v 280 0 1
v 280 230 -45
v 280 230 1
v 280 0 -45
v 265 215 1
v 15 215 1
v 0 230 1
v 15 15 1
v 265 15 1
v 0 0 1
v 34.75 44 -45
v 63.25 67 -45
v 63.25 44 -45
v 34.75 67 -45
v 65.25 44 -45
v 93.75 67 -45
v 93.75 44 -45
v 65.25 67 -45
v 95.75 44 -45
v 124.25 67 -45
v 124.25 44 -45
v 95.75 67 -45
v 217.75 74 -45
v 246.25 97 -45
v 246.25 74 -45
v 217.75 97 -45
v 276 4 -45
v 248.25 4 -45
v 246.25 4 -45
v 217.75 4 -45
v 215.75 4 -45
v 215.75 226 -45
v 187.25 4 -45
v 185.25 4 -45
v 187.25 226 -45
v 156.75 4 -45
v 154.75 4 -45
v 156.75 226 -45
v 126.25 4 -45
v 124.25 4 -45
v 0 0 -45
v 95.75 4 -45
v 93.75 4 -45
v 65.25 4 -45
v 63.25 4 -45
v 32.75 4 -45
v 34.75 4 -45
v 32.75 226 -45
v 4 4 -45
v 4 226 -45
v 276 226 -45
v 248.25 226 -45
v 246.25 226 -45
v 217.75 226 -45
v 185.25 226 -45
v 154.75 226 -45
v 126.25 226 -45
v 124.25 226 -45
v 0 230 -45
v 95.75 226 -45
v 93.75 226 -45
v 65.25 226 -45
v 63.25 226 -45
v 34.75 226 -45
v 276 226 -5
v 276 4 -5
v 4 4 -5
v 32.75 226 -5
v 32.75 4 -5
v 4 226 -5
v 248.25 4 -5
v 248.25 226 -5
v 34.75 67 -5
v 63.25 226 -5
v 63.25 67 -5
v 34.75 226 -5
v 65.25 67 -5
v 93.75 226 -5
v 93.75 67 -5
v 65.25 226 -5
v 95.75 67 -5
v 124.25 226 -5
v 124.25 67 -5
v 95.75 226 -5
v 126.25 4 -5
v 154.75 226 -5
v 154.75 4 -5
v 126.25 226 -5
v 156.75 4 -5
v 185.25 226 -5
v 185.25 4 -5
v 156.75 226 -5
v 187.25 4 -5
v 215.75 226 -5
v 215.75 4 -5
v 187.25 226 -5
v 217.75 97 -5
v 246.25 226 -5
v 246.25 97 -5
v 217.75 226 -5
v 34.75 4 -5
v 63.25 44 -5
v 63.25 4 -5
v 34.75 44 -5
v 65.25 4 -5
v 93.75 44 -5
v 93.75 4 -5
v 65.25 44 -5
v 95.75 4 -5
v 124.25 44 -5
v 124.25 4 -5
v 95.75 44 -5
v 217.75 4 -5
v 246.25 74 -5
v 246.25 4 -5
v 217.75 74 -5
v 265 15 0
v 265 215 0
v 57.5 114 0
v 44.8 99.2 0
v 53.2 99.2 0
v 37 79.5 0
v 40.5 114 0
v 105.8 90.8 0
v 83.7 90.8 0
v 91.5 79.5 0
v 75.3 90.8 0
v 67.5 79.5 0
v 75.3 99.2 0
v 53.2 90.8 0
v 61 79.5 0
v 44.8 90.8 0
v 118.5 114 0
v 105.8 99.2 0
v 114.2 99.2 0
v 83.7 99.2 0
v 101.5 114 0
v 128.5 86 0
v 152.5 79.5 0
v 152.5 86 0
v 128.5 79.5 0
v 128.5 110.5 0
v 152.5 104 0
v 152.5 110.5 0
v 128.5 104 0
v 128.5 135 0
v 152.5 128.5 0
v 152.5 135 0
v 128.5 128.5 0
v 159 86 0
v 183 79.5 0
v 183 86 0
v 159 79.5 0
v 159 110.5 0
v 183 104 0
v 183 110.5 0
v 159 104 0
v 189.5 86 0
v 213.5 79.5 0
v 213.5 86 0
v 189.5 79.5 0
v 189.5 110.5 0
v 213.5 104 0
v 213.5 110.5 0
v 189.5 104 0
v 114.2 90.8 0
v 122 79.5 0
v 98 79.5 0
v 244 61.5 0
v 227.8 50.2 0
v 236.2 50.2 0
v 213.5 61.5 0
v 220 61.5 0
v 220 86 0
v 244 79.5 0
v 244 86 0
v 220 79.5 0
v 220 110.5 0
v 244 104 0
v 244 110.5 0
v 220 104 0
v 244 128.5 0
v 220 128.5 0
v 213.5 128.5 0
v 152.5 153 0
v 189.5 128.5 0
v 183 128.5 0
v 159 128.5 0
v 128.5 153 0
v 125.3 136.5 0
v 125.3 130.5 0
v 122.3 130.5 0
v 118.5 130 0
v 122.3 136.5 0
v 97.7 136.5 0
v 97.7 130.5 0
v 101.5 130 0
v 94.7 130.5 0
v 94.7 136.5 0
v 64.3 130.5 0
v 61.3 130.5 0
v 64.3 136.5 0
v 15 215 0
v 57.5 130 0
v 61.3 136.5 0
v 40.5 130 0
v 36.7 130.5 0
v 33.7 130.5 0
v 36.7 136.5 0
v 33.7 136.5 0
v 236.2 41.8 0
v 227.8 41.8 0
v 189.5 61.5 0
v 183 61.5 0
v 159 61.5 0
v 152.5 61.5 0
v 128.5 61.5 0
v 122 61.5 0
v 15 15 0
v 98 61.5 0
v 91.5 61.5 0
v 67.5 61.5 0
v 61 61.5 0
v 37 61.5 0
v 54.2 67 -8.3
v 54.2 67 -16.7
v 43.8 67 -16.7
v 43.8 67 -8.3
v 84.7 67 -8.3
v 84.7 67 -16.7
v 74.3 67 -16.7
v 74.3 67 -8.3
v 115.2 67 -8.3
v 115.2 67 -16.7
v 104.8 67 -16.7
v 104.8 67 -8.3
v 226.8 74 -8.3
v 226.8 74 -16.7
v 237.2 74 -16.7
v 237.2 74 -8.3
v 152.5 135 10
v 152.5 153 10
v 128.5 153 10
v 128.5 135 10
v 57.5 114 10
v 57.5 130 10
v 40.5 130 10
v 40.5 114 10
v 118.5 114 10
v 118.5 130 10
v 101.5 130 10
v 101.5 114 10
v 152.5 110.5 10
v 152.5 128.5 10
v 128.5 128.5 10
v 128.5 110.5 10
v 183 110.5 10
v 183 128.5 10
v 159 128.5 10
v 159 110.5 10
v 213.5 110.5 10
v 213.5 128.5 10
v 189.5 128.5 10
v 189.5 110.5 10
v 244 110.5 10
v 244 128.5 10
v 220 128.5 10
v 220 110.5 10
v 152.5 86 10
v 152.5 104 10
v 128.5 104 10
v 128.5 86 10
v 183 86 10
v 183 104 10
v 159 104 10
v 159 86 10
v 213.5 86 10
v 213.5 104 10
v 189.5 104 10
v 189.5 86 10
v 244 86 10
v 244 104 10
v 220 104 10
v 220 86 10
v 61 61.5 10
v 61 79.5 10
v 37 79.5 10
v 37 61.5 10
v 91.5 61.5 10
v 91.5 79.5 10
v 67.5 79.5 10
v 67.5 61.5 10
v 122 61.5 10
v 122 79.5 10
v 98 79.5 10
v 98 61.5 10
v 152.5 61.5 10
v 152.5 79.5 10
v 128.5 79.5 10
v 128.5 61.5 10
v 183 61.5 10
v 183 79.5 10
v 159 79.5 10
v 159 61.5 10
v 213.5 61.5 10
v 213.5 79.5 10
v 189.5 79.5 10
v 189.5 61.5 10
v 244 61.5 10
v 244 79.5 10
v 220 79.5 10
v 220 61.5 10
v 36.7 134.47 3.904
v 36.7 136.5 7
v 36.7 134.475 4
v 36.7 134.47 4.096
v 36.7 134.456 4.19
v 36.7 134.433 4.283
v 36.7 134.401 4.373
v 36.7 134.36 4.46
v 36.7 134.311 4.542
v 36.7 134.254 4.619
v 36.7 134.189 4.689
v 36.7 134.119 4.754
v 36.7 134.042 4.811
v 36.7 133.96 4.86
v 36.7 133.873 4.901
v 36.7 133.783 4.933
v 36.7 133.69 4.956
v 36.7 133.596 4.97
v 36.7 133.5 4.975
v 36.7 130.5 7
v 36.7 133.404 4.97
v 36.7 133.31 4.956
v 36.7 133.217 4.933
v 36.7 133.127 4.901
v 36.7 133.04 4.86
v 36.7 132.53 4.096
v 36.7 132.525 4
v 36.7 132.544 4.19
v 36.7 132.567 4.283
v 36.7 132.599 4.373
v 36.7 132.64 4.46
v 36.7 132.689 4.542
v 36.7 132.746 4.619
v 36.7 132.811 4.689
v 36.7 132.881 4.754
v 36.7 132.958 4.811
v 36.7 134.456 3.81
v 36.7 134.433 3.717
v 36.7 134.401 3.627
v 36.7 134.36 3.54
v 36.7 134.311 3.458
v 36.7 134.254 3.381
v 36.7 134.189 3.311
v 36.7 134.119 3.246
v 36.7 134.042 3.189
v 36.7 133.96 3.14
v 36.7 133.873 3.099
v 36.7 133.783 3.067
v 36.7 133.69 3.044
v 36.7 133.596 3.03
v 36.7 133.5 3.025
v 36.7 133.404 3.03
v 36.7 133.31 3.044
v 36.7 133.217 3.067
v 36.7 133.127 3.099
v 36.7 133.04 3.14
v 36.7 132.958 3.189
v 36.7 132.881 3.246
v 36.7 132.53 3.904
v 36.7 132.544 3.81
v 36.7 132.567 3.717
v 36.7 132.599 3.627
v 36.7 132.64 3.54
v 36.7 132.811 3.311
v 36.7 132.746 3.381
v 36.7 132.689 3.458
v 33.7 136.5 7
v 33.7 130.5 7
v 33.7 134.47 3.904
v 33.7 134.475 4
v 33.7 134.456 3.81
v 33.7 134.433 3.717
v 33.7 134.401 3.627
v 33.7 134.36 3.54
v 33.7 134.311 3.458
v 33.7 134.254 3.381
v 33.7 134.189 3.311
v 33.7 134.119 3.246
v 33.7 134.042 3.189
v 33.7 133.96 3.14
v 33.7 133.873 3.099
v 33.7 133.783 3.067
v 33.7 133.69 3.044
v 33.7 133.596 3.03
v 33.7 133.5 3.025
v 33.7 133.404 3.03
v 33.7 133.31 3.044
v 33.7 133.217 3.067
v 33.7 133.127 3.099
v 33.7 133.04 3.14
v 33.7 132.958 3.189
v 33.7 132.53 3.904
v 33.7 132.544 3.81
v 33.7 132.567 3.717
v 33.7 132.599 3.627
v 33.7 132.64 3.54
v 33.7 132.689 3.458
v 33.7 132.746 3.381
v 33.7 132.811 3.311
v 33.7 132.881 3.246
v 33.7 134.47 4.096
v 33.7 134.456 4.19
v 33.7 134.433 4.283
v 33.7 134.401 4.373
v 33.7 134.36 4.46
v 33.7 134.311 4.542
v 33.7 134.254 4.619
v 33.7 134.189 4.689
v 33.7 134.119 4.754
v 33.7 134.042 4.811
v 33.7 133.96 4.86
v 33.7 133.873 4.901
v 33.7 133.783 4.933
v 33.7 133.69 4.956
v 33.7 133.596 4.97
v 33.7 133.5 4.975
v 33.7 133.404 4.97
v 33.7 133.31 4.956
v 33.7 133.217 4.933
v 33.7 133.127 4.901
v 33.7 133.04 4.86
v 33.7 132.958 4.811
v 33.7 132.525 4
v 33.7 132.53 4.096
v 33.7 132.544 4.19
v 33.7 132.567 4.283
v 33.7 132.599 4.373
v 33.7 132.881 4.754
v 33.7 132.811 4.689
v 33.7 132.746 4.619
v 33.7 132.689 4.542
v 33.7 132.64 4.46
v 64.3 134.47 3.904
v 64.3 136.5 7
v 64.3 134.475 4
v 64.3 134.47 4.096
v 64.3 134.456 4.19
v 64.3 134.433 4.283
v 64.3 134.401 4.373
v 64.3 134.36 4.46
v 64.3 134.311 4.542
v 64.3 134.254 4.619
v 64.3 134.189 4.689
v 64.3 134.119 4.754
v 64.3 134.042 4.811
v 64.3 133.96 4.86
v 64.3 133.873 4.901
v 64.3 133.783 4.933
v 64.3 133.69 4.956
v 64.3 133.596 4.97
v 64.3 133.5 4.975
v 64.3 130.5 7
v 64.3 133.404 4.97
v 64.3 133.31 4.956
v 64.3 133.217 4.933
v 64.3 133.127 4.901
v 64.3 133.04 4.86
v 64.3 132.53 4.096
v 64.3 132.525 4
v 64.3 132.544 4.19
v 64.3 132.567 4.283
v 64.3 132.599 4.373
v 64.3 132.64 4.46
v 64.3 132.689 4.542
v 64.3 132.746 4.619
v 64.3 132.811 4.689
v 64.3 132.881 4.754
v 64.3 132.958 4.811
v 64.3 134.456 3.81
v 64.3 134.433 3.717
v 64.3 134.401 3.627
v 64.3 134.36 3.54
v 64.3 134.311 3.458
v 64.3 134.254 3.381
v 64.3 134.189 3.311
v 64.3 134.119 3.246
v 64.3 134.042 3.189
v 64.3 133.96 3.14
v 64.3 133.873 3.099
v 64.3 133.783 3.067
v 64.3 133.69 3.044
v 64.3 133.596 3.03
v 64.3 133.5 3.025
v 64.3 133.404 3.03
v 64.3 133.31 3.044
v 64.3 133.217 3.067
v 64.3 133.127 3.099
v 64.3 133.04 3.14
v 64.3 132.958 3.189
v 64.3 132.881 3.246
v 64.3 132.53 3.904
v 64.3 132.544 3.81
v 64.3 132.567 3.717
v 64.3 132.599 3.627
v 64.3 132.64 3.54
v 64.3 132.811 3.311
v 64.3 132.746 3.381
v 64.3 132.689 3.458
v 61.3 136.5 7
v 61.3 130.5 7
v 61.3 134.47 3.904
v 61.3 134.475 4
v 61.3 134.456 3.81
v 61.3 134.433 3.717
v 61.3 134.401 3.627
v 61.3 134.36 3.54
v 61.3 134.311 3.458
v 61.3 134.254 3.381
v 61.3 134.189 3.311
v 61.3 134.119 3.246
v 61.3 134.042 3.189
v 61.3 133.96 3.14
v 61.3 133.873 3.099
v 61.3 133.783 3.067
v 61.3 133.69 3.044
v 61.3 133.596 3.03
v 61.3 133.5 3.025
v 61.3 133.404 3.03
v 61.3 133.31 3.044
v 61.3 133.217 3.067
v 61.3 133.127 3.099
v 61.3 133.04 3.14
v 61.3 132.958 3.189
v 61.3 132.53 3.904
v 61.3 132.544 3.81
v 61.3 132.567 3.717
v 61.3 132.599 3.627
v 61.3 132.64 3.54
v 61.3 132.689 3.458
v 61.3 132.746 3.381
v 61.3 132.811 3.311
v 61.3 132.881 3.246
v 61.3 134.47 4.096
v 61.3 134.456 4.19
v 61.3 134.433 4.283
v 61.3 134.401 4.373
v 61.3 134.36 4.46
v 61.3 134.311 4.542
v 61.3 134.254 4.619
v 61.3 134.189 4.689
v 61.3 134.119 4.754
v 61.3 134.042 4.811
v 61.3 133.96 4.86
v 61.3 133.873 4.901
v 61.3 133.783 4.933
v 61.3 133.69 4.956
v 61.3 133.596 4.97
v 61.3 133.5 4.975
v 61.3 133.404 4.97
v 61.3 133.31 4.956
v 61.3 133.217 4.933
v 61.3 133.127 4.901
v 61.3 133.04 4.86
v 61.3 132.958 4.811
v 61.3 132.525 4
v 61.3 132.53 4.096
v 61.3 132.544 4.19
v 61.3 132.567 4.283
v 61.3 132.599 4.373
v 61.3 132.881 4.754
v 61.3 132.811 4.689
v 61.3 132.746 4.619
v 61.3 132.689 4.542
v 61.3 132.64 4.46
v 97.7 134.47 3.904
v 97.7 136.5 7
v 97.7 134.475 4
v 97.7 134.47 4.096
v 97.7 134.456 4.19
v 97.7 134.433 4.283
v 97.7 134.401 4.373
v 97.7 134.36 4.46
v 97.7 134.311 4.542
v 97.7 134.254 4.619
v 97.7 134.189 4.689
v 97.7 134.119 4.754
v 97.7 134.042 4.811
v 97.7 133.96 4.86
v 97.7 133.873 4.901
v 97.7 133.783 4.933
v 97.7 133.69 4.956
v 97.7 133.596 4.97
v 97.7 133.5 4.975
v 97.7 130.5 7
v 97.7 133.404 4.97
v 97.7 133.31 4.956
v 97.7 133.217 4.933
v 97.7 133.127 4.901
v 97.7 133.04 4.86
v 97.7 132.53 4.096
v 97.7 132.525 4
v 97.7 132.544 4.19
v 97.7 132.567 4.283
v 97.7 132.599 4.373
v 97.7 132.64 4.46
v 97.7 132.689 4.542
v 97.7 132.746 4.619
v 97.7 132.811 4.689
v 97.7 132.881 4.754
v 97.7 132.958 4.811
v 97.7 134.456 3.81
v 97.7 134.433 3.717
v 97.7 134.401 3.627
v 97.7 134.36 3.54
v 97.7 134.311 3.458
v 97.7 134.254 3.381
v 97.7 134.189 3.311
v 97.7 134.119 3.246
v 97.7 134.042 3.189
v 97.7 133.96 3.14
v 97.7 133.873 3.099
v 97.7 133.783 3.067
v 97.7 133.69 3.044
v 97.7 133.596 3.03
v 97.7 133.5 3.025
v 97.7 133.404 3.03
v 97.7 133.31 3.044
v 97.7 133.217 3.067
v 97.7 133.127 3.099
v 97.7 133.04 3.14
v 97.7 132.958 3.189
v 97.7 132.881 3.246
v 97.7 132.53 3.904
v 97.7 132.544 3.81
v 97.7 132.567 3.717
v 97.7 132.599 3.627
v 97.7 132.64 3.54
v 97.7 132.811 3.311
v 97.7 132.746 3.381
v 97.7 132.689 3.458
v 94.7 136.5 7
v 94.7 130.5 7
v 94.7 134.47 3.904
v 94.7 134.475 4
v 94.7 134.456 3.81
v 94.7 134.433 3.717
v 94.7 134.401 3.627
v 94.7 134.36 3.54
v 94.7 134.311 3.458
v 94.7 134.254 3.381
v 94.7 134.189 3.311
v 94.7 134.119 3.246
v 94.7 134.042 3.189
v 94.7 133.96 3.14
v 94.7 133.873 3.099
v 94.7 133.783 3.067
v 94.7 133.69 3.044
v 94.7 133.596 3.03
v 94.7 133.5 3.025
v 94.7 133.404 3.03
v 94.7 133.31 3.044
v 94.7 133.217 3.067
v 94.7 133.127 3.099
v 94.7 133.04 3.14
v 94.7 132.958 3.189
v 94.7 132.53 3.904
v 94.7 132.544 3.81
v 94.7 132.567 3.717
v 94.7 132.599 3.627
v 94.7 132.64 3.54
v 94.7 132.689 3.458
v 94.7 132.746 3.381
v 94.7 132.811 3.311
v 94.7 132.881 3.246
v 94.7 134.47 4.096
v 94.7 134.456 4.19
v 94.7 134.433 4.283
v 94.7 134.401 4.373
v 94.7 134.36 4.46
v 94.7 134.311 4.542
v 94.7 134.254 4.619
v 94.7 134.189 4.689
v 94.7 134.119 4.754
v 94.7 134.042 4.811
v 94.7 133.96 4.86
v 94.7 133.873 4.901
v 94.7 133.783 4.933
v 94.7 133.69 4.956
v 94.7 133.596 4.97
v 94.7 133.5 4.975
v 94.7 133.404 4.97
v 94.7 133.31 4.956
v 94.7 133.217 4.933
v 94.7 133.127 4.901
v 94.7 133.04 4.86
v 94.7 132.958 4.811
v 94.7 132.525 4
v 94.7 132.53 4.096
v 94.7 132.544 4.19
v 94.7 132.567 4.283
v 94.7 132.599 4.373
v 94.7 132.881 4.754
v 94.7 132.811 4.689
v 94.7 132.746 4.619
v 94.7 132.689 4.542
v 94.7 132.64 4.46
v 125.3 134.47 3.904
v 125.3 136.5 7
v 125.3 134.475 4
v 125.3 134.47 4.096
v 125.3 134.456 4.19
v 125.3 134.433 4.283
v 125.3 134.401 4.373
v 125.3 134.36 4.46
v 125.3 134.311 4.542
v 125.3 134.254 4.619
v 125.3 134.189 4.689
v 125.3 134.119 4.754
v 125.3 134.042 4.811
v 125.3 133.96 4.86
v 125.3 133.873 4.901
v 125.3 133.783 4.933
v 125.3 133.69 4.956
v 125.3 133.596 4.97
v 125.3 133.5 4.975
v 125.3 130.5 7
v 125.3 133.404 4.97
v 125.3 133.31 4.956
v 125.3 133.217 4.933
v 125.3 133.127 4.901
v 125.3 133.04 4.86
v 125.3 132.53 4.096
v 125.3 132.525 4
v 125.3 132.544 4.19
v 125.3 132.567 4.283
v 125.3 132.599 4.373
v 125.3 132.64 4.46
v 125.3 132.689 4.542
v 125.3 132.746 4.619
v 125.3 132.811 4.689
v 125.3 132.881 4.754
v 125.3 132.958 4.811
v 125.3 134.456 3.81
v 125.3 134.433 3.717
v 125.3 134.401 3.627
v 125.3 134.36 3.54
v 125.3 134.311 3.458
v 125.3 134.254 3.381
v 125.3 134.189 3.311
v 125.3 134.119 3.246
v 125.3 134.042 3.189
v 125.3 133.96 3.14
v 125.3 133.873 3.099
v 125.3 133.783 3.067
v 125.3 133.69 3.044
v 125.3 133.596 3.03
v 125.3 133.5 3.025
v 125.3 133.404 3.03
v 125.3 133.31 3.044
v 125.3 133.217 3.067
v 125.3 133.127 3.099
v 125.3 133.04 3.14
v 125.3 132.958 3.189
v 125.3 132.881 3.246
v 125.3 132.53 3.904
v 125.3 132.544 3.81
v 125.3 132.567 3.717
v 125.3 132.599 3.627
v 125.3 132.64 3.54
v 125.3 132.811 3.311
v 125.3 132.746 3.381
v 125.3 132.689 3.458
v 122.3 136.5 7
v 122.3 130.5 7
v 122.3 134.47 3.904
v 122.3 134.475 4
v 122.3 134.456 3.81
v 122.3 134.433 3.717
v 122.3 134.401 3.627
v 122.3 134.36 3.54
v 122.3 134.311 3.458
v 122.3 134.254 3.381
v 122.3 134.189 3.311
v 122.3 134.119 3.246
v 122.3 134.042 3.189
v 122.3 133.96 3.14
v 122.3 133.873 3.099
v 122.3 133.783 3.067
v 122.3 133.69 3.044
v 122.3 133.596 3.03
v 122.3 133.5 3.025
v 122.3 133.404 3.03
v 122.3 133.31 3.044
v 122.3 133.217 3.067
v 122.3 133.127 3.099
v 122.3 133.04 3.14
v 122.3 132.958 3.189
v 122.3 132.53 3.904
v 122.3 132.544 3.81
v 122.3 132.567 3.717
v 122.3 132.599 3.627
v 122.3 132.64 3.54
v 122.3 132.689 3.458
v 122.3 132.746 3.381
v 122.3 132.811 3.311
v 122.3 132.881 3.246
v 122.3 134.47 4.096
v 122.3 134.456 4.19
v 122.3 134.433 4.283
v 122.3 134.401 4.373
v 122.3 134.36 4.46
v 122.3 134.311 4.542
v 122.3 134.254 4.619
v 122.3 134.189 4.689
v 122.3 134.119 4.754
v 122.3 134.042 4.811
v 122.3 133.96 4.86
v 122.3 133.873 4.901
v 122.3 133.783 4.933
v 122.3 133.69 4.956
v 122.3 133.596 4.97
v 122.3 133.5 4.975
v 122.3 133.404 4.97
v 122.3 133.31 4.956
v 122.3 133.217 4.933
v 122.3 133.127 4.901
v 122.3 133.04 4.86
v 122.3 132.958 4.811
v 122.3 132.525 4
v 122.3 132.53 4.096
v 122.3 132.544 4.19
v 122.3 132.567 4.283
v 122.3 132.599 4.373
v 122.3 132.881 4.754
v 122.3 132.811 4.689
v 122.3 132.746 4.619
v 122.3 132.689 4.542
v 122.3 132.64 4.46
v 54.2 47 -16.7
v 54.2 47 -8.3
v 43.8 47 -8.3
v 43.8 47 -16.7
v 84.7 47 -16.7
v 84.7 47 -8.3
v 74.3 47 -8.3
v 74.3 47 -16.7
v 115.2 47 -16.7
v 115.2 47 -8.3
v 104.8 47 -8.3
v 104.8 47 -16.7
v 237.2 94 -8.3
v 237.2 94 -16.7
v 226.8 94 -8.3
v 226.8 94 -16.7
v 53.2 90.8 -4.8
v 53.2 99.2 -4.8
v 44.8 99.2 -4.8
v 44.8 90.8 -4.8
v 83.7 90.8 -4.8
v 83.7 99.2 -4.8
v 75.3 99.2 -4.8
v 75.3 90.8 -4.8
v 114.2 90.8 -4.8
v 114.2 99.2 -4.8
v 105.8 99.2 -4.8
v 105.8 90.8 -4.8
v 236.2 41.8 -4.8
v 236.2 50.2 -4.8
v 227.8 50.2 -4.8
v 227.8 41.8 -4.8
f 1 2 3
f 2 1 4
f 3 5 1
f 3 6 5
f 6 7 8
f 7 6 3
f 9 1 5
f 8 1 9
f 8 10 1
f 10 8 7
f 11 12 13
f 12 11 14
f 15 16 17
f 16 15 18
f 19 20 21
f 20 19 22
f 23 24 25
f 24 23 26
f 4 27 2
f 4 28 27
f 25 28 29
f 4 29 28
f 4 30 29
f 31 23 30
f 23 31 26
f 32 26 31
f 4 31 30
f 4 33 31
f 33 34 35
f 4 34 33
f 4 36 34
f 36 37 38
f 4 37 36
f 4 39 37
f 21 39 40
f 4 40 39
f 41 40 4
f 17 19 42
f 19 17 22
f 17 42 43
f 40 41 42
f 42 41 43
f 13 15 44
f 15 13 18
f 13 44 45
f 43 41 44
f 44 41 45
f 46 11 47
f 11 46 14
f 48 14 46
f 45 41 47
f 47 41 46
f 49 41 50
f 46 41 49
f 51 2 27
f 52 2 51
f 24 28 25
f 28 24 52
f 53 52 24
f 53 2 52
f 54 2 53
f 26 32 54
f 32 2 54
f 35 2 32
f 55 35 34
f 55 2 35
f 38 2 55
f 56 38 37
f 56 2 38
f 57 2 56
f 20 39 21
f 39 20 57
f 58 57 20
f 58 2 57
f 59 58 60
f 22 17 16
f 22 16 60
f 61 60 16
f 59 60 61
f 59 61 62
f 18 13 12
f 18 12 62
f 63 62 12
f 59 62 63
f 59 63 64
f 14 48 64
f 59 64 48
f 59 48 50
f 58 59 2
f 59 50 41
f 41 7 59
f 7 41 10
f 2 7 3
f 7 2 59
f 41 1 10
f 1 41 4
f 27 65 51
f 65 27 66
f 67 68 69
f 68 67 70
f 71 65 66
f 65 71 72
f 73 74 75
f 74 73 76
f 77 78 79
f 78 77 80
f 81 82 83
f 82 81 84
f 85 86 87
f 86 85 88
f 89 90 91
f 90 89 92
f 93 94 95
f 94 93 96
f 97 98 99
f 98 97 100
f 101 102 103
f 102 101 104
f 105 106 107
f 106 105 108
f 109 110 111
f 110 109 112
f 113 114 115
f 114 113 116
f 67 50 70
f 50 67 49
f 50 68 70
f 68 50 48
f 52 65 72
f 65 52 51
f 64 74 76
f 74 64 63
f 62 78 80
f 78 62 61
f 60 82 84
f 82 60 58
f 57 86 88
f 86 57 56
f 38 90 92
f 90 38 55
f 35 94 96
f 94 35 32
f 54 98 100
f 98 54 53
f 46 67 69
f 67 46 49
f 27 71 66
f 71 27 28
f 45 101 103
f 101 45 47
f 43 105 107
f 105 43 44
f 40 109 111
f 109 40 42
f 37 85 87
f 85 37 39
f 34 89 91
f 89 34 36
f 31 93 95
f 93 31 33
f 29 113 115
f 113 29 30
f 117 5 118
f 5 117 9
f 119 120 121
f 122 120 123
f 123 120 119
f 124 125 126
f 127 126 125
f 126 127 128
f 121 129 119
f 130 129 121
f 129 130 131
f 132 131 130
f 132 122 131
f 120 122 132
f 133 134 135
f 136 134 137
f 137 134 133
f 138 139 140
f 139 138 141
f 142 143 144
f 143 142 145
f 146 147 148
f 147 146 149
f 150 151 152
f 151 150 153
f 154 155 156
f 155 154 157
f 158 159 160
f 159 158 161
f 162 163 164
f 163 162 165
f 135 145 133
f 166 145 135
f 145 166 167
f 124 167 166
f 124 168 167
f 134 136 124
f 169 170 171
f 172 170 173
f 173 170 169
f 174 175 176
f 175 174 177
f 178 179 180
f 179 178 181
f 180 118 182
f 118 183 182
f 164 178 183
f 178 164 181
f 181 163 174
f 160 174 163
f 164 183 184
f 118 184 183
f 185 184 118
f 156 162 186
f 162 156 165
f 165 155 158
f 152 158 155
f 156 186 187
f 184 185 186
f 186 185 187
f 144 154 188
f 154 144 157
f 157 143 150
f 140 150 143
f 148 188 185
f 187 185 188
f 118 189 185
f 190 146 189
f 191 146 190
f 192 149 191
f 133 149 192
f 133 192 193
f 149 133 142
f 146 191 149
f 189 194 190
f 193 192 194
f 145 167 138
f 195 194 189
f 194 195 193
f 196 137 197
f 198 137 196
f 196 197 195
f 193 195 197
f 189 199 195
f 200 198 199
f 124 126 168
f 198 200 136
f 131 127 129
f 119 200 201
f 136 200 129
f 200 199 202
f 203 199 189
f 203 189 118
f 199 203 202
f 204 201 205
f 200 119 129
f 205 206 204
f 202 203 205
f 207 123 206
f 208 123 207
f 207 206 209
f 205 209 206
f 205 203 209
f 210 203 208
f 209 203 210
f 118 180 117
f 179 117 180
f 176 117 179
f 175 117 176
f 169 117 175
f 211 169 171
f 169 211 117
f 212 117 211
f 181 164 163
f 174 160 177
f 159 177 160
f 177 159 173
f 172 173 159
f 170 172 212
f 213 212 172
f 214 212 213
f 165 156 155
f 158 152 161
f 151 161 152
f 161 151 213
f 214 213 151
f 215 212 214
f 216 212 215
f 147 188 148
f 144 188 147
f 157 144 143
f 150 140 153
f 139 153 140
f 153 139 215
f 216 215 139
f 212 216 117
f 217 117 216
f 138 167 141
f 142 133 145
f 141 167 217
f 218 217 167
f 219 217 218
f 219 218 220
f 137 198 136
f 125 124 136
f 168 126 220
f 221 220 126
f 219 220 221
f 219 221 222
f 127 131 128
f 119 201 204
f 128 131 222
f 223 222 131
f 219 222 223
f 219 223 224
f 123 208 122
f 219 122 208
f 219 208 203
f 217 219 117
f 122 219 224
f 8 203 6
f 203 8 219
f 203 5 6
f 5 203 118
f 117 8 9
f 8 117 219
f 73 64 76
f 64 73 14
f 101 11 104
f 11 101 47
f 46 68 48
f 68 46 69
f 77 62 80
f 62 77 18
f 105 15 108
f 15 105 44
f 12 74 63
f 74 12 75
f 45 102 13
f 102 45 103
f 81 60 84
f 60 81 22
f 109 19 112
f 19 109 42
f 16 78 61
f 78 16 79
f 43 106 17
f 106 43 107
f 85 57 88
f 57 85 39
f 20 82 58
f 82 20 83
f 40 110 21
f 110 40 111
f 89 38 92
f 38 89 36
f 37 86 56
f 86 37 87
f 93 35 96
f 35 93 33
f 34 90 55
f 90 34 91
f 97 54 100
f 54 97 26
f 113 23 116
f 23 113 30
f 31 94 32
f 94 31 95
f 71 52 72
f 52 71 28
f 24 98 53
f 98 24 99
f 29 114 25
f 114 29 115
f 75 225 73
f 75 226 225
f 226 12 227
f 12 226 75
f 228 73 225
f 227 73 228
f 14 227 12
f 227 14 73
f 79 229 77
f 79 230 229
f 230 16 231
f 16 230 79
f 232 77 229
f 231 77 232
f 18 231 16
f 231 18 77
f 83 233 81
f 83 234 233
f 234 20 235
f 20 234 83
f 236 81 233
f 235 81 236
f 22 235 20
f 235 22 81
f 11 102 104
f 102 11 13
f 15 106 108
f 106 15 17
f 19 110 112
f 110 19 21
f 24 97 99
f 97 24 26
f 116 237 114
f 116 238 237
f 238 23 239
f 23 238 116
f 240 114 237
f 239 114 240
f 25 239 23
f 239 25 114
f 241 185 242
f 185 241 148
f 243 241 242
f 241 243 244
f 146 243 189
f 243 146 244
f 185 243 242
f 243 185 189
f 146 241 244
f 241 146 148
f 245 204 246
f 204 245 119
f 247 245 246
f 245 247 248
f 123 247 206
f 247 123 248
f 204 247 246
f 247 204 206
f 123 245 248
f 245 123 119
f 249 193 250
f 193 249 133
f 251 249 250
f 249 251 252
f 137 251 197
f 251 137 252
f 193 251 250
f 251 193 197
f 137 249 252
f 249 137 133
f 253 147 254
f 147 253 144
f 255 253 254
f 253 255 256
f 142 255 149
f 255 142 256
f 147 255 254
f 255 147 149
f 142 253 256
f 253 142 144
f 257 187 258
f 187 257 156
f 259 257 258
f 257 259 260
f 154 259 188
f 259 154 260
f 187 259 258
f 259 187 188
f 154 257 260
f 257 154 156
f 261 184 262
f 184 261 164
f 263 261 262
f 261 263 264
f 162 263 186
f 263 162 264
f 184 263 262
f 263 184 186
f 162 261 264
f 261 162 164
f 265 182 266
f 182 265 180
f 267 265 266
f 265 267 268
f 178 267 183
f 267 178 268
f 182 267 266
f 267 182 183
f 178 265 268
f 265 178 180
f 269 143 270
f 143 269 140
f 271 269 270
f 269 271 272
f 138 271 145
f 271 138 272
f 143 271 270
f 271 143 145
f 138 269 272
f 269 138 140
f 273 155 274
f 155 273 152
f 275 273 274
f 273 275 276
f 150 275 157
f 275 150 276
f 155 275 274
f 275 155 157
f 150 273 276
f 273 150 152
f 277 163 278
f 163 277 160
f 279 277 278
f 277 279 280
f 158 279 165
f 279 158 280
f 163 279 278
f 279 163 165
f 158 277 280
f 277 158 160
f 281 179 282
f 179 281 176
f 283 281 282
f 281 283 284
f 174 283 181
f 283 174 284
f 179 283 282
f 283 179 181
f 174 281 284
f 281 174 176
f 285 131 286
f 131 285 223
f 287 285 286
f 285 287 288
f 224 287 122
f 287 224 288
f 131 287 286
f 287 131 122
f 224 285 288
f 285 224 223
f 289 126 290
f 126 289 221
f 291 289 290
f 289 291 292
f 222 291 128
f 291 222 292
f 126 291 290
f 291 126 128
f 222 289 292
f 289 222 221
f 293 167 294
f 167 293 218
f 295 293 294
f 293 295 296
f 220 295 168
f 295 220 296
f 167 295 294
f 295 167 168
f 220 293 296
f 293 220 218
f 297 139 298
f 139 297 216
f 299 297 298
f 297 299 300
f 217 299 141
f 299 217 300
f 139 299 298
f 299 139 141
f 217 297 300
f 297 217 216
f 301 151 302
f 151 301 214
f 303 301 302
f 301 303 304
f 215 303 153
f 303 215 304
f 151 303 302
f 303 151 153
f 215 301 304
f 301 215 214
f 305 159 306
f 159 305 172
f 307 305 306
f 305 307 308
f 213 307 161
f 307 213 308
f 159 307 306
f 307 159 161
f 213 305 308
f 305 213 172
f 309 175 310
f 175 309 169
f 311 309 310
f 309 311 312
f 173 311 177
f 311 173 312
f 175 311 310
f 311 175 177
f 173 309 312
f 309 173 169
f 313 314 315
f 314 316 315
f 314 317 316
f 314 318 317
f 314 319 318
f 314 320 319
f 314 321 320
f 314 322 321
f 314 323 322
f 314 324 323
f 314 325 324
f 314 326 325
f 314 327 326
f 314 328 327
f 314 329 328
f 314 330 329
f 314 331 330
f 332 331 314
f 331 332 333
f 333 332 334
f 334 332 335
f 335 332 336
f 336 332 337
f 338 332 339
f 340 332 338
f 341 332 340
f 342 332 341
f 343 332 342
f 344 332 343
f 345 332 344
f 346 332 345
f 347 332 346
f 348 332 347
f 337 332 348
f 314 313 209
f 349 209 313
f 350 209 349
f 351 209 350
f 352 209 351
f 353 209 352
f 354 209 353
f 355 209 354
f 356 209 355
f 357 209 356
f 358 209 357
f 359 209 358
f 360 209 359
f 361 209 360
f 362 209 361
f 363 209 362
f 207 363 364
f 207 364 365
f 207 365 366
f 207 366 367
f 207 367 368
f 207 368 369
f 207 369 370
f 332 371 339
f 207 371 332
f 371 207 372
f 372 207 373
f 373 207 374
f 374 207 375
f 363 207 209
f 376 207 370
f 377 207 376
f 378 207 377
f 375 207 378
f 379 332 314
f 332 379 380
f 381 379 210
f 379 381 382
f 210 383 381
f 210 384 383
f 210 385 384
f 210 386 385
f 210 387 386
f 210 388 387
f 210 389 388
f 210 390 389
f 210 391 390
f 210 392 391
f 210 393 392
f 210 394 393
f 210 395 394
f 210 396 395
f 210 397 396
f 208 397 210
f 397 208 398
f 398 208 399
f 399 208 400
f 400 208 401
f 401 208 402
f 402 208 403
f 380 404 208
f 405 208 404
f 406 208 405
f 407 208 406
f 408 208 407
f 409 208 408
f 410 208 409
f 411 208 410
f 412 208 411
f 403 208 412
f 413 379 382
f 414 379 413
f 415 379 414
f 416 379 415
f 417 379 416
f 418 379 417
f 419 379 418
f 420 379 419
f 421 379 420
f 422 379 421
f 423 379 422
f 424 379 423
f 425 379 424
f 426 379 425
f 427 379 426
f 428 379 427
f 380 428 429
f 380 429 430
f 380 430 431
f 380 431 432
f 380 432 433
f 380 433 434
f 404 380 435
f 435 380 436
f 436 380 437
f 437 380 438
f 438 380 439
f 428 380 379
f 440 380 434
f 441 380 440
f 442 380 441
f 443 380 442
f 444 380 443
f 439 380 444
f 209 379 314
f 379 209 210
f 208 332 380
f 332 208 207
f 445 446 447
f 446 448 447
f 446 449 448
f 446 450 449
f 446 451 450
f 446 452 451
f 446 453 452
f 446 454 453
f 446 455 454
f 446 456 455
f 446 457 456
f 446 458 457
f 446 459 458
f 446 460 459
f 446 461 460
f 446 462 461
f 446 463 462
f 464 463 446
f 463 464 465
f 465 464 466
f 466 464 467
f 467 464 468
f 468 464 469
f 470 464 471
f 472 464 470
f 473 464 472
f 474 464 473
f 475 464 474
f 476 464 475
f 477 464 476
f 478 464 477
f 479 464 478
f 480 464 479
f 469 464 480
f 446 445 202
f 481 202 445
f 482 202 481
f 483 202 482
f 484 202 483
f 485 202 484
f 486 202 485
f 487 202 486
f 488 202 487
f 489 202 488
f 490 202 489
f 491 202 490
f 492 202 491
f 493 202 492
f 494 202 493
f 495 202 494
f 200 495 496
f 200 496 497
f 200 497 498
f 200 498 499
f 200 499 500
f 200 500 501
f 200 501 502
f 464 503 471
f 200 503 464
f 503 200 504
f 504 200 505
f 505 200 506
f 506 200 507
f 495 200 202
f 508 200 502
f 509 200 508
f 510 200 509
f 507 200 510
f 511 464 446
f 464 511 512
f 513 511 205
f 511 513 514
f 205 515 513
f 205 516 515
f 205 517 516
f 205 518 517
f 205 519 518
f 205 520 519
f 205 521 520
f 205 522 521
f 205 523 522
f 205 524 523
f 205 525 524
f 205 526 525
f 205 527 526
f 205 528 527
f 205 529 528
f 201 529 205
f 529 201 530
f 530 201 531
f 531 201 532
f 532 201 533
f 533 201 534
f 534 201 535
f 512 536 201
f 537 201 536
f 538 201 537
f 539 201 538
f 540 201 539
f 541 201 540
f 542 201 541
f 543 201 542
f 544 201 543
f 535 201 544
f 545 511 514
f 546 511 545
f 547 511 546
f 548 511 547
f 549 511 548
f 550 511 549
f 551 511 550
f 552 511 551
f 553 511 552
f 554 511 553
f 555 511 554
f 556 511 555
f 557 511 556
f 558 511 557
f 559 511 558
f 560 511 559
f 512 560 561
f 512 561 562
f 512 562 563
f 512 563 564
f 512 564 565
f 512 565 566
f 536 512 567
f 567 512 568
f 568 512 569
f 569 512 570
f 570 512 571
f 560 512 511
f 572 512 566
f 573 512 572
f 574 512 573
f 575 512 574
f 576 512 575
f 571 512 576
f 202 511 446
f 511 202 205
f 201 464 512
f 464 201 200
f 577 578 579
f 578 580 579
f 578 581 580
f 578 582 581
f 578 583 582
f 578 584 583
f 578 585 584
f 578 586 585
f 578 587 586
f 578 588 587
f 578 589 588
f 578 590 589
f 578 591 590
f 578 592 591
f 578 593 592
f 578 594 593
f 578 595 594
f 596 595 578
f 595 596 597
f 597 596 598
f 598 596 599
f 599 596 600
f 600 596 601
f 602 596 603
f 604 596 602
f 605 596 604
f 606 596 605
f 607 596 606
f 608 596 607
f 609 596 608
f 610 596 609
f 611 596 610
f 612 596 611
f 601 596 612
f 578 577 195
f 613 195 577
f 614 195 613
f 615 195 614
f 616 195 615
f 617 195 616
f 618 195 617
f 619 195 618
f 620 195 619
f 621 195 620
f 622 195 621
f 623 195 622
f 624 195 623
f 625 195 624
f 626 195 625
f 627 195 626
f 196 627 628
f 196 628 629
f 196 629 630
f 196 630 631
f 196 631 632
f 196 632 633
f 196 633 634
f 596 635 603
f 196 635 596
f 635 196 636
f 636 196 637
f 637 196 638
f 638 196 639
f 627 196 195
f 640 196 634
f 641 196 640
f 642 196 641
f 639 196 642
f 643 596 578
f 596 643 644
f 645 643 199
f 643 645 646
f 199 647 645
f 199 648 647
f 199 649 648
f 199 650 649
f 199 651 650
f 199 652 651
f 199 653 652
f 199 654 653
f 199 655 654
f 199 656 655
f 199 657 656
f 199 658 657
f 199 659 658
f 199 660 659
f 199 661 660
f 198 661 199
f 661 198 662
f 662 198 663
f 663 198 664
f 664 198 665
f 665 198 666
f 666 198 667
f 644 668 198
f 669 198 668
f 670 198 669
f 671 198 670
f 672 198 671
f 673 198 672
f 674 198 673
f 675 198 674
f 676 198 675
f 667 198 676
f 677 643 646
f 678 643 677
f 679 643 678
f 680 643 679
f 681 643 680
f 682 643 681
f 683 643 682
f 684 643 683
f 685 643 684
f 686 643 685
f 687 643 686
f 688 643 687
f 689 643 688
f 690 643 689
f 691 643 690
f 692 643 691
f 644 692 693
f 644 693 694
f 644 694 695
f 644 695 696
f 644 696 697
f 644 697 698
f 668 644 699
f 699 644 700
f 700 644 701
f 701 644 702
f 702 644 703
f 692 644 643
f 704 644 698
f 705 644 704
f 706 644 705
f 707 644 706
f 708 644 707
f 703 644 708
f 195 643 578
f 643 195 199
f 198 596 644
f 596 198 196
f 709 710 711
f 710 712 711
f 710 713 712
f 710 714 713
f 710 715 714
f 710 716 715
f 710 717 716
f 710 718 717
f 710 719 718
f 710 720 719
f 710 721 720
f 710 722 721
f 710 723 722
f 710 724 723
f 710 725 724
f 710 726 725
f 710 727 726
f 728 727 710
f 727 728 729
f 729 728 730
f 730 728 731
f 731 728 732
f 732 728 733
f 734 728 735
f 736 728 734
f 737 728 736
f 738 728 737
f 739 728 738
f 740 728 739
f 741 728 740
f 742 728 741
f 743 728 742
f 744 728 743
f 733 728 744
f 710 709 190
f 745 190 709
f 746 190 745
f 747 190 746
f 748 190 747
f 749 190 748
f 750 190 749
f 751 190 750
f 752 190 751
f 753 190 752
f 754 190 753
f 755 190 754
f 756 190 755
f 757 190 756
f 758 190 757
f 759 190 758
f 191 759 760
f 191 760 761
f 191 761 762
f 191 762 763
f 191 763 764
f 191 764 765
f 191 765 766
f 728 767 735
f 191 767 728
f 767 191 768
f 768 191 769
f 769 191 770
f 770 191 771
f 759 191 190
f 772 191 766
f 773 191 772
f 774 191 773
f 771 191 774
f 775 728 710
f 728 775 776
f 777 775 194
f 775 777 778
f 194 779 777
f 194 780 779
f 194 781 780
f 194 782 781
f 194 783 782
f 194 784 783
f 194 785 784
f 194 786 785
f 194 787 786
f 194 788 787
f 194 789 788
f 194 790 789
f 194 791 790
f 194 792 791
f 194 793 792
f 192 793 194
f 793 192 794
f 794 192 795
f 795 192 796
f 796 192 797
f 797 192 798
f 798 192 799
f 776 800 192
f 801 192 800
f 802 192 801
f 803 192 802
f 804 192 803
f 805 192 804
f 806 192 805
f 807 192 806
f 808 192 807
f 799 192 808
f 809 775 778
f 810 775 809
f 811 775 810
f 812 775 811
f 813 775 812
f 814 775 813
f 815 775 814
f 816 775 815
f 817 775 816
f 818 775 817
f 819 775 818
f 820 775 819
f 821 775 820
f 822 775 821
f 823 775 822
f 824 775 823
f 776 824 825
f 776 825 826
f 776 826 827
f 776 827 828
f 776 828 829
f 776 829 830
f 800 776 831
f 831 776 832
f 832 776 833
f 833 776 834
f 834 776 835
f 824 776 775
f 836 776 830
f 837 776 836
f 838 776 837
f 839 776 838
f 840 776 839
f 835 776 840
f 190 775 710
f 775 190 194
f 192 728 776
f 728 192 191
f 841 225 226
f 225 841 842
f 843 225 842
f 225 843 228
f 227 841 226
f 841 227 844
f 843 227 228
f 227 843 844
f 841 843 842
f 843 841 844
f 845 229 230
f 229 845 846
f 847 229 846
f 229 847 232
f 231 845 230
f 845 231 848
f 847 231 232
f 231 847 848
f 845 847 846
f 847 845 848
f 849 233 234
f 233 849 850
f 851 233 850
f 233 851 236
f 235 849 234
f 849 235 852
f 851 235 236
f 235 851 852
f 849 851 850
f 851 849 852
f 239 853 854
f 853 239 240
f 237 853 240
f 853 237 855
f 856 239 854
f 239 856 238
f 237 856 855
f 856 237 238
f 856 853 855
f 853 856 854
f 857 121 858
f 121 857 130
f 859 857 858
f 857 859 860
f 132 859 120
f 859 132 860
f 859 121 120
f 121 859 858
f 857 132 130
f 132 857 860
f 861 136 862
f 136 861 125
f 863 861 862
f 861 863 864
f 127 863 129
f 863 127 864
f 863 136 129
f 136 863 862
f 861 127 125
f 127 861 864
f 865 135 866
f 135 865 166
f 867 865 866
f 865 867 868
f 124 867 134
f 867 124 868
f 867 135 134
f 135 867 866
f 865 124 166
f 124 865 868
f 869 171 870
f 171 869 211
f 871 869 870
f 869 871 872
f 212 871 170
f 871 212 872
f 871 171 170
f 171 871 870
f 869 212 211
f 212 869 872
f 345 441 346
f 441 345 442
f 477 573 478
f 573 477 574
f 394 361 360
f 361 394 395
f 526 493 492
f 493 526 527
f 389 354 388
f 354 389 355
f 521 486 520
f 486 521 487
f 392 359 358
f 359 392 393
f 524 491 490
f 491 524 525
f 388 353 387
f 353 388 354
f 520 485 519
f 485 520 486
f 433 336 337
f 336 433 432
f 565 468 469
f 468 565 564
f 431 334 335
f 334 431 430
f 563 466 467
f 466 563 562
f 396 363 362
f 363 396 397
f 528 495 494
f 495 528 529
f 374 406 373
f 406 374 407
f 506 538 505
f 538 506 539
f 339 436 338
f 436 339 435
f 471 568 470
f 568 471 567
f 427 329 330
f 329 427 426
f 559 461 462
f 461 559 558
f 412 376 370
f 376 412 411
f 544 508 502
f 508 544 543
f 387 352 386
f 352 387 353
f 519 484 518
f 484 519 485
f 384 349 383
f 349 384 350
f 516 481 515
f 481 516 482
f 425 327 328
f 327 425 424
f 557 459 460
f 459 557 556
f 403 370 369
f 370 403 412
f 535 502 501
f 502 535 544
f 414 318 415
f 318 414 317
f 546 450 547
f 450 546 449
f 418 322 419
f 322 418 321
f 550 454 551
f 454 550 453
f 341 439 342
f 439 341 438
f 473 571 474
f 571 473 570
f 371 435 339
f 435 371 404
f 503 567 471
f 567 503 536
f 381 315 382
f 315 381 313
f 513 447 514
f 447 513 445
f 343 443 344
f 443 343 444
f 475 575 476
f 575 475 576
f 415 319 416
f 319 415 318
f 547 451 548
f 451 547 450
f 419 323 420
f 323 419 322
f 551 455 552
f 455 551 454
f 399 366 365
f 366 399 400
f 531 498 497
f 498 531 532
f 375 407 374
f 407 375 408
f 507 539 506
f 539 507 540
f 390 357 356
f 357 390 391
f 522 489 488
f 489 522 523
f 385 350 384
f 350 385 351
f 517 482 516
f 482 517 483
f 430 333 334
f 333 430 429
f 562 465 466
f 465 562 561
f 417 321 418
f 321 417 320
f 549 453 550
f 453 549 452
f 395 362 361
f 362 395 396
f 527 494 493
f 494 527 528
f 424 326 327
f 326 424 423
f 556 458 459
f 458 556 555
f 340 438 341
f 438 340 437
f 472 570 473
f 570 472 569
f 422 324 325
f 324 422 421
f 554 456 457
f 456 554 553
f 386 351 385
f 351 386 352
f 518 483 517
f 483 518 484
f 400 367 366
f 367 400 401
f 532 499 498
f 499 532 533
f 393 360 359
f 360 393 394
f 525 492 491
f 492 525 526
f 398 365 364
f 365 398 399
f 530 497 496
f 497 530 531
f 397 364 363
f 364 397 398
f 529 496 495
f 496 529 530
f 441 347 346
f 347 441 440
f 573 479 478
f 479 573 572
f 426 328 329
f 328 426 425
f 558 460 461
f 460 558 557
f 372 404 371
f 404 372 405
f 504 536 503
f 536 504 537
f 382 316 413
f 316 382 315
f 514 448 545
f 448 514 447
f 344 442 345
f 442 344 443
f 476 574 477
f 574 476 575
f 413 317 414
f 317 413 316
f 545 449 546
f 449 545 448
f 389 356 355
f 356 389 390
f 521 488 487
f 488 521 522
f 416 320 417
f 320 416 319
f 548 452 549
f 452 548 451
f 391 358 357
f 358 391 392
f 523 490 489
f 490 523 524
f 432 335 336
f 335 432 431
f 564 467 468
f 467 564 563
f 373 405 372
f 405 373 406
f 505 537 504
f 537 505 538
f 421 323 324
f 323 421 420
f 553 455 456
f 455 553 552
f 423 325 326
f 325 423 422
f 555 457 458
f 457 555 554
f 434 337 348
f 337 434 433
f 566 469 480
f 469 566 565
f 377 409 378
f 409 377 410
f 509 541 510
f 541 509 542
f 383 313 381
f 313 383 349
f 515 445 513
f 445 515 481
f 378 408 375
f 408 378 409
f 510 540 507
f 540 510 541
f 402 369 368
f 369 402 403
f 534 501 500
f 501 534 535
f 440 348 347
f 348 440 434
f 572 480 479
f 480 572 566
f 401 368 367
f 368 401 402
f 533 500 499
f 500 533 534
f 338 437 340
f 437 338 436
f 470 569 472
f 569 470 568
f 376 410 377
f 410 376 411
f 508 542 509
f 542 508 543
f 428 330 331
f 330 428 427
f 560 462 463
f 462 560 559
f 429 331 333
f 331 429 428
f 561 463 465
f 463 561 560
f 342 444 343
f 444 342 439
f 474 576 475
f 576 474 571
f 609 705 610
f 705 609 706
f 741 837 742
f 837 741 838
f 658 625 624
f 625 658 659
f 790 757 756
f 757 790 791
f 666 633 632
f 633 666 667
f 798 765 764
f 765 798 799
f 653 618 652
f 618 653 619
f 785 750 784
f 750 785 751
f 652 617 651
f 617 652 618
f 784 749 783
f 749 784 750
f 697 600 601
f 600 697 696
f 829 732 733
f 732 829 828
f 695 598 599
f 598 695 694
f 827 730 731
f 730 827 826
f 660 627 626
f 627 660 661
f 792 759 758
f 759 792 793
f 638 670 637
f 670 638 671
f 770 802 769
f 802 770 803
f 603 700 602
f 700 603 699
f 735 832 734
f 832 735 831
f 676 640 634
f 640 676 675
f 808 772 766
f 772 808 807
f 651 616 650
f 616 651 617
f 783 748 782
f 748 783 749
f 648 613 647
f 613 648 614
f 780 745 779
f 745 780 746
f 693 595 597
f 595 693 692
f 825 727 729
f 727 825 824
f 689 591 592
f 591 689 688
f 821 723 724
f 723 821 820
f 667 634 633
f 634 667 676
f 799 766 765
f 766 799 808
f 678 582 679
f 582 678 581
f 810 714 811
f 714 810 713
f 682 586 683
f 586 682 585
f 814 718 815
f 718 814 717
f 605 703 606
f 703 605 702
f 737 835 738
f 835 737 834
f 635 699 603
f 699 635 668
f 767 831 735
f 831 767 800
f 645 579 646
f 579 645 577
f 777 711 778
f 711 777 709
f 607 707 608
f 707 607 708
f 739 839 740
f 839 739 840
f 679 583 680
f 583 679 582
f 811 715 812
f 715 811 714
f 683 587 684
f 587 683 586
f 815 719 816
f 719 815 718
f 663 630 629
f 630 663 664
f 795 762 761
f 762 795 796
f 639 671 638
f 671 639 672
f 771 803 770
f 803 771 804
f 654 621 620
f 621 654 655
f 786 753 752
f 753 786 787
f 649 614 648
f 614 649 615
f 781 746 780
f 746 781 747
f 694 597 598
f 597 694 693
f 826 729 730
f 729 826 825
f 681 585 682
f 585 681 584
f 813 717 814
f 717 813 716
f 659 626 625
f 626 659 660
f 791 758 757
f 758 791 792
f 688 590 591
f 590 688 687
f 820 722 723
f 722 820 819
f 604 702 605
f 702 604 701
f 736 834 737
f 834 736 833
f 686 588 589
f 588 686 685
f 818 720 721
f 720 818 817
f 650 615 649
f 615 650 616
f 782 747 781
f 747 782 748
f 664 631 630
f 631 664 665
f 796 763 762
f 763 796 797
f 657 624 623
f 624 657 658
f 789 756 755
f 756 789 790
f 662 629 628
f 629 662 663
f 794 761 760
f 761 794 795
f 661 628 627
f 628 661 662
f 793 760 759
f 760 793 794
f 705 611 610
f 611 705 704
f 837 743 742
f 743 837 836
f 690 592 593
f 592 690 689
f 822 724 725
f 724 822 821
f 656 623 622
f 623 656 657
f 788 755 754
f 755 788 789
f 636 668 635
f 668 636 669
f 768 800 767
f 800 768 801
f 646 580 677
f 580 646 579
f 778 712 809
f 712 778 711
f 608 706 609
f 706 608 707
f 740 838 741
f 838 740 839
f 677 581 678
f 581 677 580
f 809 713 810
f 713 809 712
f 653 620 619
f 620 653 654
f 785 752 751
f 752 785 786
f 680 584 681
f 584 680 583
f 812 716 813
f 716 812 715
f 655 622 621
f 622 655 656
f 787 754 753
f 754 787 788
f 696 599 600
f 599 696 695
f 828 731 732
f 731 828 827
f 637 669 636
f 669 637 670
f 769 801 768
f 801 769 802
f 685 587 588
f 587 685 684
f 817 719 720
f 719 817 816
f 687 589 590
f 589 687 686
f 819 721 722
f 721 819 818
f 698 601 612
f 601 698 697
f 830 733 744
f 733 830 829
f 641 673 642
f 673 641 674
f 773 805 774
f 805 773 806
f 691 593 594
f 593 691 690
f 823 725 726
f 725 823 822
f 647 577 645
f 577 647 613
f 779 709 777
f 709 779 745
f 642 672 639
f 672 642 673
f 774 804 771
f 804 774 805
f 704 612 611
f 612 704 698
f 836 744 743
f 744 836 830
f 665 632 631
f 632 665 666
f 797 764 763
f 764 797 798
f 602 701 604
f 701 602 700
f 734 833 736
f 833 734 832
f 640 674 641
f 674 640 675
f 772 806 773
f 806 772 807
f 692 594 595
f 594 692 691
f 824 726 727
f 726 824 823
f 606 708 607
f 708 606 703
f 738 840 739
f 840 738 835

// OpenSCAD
// Flat replica of the desk's top: same outer size and rim, so the frame clamps on
// exactly as on the real case. Fixed bosses at every button, plunger holes for the
// spring-loaded test buttons at SC1, SC2, SC3 and SPREKEN, hinge lugs for a working
// flip cover at the two covered buttons. Print 1, open side down.
include <../cad/params.scad>
include <../cad/lib.scad>

module replica_panel() {
    leaf_tunnel_w = tb_leaf_b + 0.4;
    difference() {
        union() {
            difference() {
                translate([0, 0, -rp_h]) cube([case_w, case_d, rp_h + case_rim_h]);
                // open underside
                box(rp_wall, case_w - rp_wall, rp_wall, case_d - rp_wall, -rp_h - 1, -rp_t);
                // panel recess inside the rim
                box(case_rim_w, case_w - case_rim_w, case_rim_w, case_d - case_rim_w, 0, case_rim_h + 1);
            }
            // ribs along Y between columns
            for (c = [0 : 7]) translate([btn_x(c) - pitch_x / 2 - rp_rib / 2, rp_wall - 0.1, -rp_h])
                cube([rp_rib, case_d - 2 * rp_wall + 0.2, rp_h - rp_t + 0.1]);
            // leaf spring pillars
            for (t = tb_sockets) {
                p = btn_xy(t[0]);
                y_mouth = p[1] + t[1] * tb_leaf_l;
                y_far = y_mouth + t[1] * (tb_root_l + 3);
                box(p[0] - pitch_x / 2, p[0] + pitch_x / 2, min(y_mouth, y_far), max(y_mouth, y_far), -rp_h, -rp_t + 0.1);
            }
            // bosses
            for (b = buttons) {
                socket = len([for (t = tb_sockets) if (t[0] == b[0]) t]) > 0;
                covered = len([for (c = covered_buttons) if (c == b[0]) c]) > 0;
                sx = covered ? cover_w - 7 : btn_w; // clears the dummy cover as it swings
                sy = covered ? cover_d - 7 : btn_d;
                p = panel_xy(b[0]);
                if (!socket) translate([p[0] - sx / 2, p[1] + (covered ? cover_off_y : 0) - sy / 2, -0.1])
                    cube([sx, sy, btn_proud + 0.1]);
            }
            // hinge lugs on the covered buttons
            for (c = covered_buttons, s = [-1, 1]) {
                p = panel_xy(c);
                translate([p[0] + s * (cover_w / 2 + 1.8) - 1.5, p[1] + cover_off_y + cover_d / 2 - 3, -0.1])
                    cube([3, 6, cover_pin_z + 0.1 + 3]);
            }
        }
        // leaf tunnels, open towards the stem
        for (t = tb_sockets) {
            p = btn_xy(t[0]);
            y_mouth = p[1] + t[1] * tb_leaf_l;
            y_far = y_mouth + t[1] * tb_root_l;
            z1 = tb_leaf_z + tb_preload;
            box(p[0] - leaf_tunnel_w / 2, p[0] + leaf_tunnel_w / 2, min(y_mouth, y_far) - (t[1] < 0 ? 0 : 1), max(y_mouth, y_far) + (t[1] < 0 ? 1 : 0),
                z1 - tb_root_h - 0.2, z1 + 0.2);
        }
        // plunger holes. A printed skin closes each hole at the plate's underside, so the plate bridges
        // whole between the ribs and the hole's walls have something to stand on: cut it out after printing
        for (t = tb_sockets) {
            p = btn_xy(t[0]);
            box(p[0] - tb_stem / 2 - 0.2, p[0] + tb_stem / 2 + 0.2, p[1] - tb_stem / 2 - 0.2, p[1] + tb_stem / 2 + 0.2, -rp_t + ten_membrane, 1);
        }
        // hinge pin holes: 1.75 mm filament
        for (c = covered_buttons) {
            p = panel_xy(c);
            translate([p[0] - cover_w, p[1] + cover_off_y + cover_d / 2, cover_pin_z]) rotate([0, 90, 0]) cylinder(d = 1.95, h = 2 * cover_w);
        }
    }
}

replica_panel();
